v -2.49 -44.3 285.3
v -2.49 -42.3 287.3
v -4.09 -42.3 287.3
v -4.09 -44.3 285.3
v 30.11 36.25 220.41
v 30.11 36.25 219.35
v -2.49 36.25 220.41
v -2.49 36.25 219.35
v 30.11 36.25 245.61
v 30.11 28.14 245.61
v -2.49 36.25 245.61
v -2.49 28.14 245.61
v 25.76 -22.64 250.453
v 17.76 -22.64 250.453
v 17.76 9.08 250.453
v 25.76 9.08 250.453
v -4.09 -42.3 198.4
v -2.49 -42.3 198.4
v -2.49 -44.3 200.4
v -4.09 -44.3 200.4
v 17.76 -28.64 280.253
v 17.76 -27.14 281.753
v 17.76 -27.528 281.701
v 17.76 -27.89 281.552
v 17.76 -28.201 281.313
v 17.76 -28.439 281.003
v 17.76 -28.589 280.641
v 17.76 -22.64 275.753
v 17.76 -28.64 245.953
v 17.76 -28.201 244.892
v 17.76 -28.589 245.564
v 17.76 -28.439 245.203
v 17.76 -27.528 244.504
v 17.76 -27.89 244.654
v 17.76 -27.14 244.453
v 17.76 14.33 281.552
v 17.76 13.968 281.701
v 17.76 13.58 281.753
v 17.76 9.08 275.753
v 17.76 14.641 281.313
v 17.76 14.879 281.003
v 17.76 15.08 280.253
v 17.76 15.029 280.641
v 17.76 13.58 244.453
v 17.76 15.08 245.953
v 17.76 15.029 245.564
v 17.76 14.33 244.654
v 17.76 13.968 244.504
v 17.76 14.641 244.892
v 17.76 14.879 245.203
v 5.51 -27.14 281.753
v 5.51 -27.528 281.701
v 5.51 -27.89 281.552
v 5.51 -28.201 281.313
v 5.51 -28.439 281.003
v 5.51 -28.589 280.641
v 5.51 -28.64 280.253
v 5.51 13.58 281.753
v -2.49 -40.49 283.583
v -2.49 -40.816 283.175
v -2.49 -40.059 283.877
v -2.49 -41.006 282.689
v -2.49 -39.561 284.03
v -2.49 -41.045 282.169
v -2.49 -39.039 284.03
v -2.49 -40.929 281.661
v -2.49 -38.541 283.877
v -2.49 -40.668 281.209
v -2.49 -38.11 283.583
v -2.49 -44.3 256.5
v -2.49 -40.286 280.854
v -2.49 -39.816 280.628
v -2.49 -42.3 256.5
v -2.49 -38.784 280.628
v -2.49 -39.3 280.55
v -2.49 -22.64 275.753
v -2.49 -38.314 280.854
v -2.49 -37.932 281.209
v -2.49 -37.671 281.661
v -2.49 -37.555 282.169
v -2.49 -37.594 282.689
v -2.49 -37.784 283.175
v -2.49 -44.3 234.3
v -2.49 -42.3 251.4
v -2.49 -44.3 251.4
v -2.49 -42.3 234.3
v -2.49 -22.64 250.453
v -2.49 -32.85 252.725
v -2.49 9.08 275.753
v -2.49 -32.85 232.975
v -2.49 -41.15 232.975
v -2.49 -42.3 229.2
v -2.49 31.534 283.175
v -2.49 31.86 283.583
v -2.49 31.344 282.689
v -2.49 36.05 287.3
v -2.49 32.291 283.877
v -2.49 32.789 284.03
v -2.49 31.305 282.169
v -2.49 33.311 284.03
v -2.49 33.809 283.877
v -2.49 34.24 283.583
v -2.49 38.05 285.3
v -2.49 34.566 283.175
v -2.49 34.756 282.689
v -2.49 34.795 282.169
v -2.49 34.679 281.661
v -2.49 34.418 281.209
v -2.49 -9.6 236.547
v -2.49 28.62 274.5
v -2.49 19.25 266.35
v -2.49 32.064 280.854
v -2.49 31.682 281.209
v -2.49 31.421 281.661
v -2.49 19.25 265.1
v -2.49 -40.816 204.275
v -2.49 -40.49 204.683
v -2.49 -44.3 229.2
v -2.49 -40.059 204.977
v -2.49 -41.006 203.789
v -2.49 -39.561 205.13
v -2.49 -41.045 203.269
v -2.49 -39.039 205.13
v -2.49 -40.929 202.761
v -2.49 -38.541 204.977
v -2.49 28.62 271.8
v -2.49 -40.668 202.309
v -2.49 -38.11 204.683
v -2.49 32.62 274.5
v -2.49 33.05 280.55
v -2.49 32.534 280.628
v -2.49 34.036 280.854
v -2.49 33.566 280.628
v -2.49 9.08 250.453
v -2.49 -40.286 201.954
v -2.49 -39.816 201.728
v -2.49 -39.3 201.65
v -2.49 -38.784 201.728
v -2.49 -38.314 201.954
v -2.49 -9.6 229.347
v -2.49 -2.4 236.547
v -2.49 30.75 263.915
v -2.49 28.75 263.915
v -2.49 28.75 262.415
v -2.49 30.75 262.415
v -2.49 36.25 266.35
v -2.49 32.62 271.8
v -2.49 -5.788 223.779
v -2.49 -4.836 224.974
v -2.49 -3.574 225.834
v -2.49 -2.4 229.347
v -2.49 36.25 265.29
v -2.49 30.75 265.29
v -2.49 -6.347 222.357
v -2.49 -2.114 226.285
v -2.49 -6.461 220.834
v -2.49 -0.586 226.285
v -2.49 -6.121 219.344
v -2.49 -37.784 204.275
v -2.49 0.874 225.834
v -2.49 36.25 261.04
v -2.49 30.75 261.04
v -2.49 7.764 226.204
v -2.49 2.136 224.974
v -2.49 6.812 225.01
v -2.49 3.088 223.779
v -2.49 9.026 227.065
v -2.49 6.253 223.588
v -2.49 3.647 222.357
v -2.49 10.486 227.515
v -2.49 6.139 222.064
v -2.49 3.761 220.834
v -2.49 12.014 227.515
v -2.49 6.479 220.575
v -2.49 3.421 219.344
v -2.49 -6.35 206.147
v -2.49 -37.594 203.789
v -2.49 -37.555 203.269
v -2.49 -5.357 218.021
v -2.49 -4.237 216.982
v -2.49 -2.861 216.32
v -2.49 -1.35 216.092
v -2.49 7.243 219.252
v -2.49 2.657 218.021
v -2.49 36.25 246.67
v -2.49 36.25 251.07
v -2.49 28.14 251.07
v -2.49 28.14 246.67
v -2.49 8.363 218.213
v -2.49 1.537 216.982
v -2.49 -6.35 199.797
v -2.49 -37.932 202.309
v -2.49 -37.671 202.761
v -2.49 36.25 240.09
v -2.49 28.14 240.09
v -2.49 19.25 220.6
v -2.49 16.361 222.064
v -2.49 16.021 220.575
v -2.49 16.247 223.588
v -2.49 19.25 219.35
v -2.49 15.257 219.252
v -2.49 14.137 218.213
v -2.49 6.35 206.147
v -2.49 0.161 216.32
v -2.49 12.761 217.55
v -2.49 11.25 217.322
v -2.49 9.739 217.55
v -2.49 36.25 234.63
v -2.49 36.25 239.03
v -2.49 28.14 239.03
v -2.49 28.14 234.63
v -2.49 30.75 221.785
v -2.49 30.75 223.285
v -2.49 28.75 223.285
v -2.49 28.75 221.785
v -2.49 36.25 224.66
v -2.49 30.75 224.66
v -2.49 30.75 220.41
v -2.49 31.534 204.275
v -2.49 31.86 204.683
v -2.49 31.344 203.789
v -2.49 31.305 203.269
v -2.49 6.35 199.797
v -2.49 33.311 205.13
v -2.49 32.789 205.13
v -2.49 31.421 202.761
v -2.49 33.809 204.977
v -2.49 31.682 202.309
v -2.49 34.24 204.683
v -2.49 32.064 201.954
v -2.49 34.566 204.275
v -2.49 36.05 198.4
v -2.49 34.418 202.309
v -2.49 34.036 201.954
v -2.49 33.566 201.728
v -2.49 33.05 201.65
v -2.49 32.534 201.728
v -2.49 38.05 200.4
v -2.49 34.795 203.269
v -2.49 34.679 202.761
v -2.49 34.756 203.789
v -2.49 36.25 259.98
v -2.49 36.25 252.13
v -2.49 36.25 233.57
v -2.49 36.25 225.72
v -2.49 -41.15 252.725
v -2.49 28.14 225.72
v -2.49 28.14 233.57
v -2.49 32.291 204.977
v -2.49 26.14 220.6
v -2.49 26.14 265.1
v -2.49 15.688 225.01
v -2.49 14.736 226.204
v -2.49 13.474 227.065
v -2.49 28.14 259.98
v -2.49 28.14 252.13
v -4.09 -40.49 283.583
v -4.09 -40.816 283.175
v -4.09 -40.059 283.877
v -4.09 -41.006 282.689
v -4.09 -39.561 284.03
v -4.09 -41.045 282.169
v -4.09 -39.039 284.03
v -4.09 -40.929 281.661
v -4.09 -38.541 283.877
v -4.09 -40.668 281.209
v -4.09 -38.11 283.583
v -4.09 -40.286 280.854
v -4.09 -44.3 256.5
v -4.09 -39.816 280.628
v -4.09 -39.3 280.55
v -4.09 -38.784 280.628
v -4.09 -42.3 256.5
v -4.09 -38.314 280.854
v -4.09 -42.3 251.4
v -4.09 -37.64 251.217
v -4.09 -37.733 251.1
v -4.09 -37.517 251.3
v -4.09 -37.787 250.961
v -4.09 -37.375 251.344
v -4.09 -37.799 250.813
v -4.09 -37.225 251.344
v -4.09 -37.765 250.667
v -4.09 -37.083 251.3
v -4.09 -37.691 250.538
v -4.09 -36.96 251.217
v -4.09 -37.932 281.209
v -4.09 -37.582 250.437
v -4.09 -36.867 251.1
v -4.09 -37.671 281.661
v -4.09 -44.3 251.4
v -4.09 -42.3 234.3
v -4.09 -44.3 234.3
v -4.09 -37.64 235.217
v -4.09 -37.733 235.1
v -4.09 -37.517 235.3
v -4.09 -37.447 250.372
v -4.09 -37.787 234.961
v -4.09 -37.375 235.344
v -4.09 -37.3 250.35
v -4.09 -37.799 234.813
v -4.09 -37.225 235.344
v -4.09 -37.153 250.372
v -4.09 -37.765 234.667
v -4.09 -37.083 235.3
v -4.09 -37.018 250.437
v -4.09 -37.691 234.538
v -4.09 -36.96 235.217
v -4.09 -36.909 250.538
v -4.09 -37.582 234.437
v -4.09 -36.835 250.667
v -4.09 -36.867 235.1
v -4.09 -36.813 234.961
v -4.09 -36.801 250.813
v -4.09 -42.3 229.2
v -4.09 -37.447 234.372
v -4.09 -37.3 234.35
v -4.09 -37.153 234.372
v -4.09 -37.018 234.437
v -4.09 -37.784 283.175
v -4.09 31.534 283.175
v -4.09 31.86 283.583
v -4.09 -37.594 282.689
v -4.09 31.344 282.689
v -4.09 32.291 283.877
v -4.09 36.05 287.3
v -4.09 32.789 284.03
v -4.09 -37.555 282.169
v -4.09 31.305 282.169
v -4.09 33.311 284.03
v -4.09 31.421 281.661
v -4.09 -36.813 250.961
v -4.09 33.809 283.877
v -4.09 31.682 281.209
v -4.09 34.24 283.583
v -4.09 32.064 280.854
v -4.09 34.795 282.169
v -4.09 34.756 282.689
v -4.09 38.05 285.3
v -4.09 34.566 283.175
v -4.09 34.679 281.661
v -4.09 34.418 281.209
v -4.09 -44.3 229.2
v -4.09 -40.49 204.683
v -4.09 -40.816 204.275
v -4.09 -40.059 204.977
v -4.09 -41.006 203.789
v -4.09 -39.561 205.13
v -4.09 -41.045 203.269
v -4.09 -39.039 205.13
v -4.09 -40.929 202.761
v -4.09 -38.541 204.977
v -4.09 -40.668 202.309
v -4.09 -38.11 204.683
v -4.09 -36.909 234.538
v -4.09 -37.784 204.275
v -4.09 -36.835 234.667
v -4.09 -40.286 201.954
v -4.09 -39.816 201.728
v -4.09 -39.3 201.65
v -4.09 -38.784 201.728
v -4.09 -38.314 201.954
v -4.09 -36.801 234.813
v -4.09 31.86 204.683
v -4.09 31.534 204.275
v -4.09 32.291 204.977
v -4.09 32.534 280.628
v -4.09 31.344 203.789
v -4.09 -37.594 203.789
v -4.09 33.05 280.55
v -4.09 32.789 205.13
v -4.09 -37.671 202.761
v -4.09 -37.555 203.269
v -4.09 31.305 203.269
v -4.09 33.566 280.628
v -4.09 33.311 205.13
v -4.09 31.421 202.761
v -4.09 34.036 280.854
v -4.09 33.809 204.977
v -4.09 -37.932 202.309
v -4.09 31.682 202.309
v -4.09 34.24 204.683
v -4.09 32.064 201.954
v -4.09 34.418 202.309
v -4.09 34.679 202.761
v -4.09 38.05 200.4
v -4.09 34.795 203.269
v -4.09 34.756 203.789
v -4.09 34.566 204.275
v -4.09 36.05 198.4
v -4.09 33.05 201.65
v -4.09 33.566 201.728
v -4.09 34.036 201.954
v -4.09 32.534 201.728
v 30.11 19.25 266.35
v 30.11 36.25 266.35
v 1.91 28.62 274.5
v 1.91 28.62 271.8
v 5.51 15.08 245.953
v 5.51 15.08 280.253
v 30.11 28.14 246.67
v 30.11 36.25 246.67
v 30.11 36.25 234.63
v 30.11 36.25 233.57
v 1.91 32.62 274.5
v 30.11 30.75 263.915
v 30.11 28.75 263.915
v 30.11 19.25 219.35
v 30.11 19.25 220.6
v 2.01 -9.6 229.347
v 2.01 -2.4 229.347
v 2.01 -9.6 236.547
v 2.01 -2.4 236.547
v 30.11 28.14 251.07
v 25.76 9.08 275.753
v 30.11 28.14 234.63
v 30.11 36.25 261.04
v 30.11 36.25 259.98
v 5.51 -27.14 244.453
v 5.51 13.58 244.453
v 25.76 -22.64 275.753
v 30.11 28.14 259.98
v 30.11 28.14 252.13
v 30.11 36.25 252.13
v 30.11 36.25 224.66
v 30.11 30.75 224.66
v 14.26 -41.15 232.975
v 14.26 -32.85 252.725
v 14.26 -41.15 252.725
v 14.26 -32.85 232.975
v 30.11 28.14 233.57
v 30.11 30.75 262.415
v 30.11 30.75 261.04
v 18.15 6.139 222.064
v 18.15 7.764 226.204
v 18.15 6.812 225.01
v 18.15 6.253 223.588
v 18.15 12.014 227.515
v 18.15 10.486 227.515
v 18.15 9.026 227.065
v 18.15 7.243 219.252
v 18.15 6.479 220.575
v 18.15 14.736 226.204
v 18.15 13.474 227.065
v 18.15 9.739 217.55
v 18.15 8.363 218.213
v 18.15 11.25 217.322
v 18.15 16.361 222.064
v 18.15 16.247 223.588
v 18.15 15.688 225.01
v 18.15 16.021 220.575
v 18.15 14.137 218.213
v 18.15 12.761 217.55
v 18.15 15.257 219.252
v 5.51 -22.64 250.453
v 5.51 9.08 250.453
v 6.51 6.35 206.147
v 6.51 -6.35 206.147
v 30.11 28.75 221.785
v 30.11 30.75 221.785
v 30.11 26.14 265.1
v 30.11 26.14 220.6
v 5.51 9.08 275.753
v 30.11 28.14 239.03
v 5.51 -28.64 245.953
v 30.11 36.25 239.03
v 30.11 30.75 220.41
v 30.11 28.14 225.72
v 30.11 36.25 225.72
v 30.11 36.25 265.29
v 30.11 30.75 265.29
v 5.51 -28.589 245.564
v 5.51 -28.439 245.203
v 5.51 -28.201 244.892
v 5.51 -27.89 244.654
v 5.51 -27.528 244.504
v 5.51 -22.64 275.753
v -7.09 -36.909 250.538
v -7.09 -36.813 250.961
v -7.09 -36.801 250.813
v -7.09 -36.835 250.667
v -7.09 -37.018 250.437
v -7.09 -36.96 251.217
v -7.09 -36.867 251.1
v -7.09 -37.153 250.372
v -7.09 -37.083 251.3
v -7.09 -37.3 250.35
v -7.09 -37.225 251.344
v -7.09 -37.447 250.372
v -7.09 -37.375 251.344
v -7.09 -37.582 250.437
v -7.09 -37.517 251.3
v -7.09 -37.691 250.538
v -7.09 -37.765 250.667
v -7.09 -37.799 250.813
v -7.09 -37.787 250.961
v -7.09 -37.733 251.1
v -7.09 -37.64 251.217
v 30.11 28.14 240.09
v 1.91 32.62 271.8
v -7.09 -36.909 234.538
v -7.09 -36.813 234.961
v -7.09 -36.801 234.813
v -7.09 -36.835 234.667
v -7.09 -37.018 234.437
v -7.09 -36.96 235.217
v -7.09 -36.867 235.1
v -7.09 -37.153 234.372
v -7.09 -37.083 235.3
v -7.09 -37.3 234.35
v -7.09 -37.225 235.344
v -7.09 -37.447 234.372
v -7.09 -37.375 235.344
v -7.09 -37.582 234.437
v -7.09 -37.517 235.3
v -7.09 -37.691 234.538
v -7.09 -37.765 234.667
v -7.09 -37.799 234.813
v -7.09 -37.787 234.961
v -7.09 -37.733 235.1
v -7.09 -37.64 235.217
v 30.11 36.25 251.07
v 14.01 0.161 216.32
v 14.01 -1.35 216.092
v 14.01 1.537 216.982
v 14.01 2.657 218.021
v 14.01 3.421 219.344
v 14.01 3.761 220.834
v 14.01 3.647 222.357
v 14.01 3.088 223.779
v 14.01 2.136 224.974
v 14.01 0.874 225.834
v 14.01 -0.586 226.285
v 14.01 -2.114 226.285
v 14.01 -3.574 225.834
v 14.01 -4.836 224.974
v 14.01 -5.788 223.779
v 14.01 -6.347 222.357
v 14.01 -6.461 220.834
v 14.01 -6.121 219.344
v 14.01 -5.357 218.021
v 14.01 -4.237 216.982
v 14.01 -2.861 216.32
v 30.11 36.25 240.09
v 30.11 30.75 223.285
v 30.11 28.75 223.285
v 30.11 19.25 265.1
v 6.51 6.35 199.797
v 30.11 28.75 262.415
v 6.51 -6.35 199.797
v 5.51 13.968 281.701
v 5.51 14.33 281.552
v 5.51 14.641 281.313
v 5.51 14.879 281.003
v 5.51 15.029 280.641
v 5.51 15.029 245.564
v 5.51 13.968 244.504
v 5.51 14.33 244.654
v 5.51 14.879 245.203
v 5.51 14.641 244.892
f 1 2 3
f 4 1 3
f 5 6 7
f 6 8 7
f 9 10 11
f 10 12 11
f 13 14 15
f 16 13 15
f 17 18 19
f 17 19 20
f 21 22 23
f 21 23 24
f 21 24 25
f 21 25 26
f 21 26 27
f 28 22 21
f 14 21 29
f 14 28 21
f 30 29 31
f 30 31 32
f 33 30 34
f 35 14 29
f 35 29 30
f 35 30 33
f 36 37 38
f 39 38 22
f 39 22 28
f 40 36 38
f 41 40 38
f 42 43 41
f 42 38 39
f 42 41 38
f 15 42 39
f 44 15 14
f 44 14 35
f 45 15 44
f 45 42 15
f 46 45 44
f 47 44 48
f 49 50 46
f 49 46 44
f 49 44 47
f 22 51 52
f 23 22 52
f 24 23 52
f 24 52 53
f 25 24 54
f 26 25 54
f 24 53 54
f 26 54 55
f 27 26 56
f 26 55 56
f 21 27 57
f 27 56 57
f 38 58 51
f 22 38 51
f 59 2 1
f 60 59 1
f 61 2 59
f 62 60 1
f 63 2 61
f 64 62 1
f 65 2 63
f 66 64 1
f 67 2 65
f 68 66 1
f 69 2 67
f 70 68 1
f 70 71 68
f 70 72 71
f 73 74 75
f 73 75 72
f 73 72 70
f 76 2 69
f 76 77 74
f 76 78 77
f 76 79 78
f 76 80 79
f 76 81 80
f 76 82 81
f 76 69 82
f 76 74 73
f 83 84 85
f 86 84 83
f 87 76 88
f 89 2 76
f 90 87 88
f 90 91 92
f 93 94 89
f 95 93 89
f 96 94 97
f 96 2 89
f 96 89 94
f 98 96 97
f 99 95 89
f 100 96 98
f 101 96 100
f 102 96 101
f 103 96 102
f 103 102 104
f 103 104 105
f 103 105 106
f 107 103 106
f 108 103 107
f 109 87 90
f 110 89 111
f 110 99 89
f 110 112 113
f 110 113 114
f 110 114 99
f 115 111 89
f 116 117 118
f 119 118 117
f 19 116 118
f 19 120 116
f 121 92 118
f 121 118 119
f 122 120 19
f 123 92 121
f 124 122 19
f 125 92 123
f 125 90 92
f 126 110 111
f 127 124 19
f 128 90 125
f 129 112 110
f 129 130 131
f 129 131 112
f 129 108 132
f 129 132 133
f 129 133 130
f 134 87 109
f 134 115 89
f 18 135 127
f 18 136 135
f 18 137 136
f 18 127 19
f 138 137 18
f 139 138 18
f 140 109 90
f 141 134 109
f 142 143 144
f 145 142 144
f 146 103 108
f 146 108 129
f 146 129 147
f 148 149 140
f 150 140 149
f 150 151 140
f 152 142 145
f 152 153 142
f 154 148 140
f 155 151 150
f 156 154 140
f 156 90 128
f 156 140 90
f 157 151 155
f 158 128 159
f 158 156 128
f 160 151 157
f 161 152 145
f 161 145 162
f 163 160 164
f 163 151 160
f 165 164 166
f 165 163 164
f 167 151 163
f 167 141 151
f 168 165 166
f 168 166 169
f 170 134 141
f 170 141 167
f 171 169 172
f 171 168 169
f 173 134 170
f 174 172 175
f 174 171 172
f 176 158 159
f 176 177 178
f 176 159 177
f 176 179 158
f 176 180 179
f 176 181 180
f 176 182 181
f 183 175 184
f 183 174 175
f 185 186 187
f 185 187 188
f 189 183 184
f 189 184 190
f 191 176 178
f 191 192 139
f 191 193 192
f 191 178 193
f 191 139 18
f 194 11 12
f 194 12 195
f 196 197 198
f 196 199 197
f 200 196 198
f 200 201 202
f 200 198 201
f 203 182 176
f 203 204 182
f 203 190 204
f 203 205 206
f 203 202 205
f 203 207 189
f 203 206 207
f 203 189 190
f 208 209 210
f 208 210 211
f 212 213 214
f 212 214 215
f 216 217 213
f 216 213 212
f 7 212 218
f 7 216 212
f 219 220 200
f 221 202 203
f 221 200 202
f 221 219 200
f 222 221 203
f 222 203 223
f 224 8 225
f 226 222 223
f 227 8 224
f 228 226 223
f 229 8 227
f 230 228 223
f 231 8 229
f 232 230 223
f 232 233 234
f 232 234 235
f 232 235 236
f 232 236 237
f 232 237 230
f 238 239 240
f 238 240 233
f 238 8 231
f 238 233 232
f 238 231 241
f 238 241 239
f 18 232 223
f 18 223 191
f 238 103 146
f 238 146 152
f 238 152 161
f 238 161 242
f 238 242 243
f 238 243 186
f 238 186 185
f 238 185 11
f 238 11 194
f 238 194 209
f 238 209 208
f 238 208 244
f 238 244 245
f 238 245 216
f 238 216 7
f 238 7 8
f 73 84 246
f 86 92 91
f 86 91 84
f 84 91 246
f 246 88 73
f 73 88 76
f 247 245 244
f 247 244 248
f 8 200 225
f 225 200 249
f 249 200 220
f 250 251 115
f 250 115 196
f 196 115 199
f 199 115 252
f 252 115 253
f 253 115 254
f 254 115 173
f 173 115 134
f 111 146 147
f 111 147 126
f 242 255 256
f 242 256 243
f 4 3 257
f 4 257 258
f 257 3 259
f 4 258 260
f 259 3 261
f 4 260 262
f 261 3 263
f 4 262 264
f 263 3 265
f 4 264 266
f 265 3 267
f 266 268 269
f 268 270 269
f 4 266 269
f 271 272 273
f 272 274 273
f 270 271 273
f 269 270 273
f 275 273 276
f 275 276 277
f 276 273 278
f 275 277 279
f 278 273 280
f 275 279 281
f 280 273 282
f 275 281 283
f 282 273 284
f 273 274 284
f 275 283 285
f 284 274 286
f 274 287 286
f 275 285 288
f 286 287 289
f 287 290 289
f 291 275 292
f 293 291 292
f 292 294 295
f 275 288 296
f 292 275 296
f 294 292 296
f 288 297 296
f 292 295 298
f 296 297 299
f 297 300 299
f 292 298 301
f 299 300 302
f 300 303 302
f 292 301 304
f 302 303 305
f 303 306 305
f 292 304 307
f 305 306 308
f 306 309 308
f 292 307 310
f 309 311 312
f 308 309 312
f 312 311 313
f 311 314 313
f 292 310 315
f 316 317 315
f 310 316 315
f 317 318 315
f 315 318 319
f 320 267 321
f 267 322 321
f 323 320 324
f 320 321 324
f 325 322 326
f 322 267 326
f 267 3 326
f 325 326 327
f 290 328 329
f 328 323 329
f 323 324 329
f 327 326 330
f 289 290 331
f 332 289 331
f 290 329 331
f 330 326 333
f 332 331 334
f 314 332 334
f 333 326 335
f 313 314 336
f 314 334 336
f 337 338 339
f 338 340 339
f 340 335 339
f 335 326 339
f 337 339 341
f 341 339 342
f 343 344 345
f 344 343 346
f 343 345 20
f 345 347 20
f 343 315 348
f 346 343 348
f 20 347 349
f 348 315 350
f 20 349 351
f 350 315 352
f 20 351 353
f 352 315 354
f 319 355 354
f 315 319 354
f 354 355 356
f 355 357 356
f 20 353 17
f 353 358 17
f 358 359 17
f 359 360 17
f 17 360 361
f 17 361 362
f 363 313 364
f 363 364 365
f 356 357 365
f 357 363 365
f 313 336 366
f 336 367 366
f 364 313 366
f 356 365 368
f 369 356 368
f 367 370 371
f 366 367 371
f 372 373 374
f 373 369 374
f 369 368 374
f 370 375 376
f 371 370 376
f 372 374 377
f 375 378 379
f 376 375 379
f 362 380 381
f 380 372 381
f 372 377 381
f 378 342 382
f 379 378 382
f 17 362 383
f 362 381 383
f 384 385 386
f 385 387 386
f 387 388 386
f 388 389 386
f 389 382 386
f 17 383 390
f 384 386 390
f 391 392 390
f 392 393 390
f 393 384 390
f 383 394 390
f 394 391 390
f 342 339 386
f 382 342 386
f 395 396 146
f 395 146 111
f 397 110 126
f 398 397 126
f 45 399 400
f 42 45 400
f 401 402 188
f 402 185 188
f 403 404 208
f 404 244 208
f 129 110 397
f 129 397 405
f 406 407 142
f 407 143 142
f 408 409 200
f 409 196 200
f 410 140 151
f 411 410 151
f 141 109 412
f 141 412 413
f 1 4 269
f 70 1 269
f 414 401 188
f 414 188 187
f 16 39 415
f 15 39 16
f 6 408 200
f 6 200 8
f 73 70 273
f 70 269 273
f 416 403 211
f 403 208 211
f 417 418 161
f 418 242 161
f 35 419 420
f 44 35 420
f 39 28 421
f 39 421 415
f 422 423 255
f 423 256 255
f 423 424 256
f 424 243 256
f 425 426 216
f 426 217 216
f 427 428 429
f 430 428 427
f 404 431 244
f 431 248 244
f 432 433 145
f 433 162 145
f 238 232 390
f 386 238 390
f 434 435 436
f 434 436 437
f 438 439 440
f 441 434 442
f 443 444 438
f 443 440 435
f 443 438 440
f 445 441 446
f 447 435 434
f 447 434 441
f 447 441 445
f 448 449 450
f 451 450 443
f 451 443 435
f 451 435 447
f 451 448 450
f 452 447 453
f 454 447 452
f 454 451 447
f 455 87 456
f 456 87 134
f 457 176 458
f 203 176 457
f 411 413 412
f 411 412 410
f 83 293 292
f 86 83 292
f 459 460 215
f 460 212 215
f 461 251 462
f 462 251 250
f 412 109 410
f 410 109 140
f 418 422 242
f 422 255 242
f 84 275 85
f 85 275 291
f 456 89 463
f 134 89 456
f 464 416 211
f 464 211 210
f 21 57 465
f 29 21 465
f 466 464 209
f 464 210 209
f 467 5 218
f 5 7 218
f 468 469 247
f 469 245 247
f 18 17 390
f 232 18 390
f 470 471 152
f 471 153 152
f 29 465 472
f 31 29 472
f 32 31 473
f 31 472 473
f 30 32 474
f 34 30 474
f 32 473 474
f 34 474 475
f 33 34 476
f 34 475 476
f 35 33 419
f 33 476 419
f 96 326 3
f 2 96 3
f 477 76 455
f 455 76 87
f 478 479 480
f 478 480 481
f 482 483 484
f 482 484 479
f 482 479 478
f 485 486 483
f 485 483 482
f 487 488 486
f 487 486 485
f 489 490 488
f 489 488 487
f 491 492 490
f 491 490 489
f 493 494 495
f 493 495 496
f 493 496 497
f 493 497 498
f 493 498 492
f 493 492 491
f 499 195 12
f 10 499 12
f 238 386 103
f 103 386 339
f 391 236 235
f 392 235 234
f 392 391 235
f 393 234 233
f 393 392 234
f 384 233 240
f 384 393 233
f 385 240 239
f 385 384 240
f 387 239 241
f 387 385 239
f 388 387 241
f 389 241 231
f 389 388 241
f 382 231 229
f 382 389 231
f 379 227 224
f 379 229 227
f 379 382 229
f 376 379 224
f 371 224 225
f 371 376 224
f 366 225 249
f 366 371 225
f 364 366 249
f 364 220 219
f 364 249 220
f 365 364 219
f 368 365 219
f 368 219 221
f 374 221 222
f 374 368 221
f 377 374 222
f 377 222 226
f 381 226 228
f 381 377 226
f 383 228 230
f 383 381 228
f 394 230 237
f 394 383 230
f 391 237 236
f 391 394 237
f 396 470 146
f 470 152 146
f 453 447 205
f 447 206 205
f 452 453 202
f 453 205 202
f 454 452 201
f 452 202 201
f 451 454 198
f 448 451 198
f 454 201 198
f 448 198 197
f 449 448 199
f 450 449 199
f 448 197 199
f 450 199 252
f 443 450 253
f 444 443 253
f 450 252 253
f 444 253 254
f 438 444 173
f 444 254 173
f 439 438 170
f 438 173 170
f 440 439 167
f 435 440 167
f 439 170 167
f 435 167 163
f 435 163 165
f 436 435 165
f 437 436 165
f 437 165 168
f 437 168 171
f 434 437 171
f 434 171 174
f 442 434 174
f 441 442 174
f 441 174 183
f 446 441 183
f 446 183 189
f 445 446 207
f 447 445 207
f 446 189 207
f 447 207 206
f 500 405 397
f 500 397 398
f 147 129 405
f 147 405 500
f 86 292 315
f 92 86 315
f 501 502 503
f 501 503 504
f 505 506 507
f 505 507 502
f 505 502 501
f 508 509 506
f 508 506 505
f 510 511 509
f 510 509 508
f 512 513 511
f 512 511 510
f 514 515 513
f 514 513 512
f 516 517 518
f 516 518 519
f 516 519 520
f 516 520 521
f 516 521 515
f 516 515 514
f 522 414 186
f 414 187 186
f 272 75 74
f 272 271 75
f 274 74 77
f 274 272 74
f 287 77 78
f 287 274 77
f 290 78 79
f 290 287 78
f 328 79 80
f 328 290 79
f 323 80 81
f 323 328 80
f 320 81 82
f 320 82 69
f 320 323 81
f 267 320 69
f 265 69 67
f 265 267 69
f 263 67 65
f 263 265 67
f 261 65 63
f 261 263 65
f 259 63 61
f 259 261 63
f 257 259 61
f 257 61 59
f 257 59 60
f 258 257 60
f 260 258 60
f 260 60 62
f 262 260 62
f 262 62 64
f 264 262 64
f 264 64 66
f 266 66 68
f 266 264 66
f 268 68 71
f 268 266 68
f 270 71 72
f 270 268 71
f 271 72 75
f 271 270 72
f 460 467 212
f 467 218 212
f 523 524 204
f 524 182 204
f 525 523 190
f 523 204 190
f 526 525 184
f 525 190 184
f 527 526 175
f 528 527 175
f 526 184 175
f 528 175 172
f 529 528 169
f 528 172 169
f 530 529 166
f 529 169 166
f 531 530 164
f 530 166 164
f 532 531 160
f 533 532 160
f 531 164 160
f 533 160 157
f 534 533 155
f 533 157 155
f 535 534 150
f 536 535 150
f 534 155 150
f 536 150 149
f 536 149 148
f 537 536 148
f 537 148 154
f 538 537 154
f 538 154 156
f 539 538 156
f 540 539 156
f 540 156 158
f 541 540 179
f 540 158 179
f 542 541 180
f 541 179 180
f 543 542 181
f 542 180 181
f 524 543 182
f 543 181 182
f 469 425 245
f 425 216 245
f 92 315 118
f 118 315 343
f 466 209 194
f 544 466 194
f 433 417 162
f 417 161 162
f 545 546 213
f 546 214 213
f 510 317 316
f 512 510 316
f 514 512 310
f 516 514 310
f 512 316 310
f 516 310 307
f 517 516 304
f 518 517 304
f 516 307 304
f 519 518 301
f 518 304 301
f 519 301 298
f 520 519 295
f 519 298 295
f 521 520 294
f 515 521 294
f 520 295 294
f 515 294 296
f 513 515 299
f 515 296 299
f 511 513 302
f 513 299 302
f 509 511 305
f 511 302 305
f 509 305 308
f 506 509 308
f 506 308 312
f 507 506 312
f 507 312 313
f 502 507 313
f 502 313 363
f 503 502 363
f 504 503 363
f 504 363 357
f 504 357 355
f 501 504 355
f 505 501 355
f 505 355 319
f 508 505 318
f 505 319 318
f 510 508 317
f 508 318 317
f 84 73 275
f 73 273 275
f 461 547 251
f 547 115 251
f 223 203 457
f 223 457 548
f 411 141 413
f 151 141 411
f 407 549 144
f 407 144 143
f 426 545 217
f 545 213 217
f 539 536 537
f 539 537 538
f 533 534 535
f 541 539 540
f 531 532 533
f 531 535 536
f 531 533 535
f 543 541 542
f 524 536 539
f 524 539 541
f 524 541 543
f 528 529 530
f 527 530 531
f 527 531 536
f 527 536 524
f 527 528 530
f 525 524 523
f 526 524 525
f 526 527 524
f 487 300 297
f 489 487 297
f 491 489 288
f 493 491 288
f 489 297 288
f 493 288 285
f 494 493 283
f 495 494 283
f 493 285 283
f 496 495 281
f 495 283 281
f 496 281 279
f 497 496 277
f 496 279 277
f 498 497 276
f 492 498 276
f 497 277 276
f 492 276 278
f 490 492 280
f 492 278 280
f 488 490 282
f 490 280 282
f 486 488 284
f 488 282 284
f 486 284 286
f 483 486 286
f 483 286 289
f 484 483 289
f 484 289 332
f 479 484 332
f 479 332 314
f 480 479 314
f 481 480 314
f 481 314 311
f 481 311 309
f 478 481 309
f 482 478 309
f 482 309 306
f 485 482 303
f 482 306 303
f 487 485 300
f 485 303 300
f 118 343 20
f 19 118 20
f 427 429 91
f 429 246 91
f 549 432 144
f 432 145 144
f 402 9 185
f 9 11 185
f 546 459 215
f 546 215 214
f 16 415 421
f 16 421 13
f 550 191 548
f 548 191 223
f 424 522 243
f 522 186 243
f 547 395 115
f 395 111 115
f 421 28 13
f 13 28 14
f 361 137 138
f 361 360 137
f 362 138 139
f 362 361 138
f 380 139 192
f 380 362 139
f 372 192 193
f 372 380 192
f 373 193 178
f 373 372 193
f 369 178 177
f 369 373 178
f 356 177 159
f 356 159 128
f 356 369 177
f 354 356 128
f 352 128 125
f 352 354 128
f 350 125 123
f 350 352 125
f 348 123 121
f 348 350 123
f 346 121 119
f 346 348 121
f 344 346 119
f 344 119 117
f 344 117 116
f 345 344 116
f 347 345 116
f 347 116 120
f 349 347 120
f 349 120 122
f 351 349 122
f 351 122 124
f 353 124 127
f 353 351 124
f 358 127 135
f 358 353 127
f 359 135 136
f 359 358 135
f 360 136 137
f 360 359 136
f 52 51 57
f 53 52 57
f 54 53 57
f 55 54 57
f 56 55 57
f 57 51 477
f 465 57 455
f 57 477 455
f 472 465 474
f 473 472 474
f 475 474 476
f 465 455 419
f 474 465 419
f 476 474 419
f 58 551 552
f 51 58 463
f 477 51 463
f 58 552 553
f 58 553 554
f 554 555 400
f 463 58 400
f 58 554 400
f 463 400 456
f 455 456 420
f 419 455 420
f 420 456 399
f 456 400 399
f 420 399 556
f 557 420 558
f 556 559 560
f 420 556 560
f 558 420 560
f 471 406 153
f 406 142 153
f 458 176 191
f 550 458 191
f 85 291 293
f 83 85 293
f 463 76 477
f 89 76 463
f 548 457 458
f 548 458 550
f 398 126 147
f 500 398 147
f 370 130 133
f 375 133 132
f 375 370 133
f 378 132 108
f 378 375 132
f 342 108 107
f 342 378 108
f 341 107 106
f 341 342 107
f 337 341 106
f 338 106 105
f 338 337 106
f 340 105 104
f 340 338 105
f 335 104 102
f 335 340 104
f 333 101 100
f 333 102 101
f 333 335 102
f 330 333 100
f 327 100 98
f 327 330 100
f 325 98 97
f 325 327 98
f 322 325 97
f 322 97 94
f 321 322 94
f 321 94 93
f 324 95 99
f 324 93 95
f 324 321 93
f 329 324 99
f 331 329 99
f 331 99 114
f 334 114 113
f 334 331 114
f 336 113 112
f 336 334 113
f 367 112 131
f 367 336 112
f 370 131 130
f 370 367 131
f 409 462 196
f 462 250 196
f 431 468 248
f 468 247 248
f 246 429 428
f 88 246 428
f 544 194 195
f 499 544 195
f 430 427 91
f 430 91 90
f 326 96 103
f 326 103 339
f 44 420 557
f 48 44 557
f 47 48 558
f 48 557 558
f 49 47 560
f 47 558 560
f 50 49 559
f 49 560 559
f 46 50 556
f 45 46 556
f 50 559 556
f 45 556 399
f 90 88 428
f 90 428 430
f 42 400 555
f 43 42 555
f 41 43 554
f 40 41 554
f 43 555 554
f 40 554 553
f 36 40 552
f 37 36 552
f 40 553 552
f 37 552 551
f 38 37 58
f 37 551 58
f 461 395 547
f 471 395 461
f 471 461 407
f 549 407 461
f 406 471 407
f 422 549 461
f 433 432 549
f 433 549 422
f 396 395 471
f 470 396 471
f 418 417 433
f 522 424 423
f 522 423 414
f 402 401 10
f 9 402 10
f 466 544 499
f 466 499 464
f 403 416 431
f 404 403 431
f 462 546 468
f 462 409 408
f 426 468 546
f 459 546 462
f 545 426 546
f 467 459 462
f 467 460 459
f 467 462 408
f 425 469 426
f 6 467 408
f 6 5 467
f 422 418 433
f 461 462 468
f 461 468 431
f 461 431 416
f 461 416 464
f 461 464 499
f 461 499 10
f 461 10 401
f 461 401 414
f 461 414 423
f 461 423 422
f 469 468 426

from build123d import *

# Parameters (mm, degrees)
BOSS_EXTRUDE1_START        = -1.6
BOSS_EXTRUDE1_OUTLINE_W    = 25.3
BOSS_EXTRUDE1_OUTLINE_H    = 31.72
BOSS_EXTRUDE1_DEPTH        = 29.85
BOSS_EXTRUDE1_START_2      = 8
BOSS_EXTRUDE1_2_OUTLINE_W  = 25.3
BOSS_EXTRUDE1_2_OUTLINE_H  = 31.72
BOSS_EXTRUDE1_2_OUTLINE_R  = 5.125
BOSS_EXTRUDE1_2_DEPTH      = 12.25
BOSS_EXTRUDE1_3_OUTLINE_R  = 1.75
BOSS_EXTRUDE1_3_OUTLINE_W  = 25.3
BOSS_EXTRUDE1_3_OUTLINE_H  = 31.72
BOSS_EXTRUDE1_3_DEPTH      = 1.6
BOSS_EXTRUDE1_4_OUTLINE_R  = 5.125
BOSS_EXTRUDE1_4_OUTLINE_W  = 19.75
BOSS_EXTRUDE1_4_OUTLINE_H  = 8.3
BOSS_EXTRUDE1_4_DEPTH      = 16.14
BOSS_EXTRUDE1_5_OUTLINE_W  = 6.35
BOSS_EXTRUDE1_5_OUTLINE_H  = 12.7
BOSS_EXTRUDE1_5_DEPTH      = 9
BOSS_EXTRUDE1_START_3      = 28.25
BOSS_EXTRUDE1_6_DEPTH      = 1.75
BOSS_EXTRUDE1_7_OUTLINE_W  = 7.2
BOSS_EXTRUDE1_7_OUTLINE_H  = 7.2
BOSS_EXTRUDE1_7_DEPTH      = 4.5
BOSS_EXTRUDE1_START_4      = 16.14
BOSS_EXTRUDE1_8_OUTLINE_W  = 19.75
BOSS_EXTRUDE1_8_OUTLINE_H  = 8.3
BOSS_EXTRUDE1_8_DEPTH      = 0.61
BOSS_EXTRUDE1_START_5      = -1.5
BOSS_EXTRUDE1_9_OUTLINE_W  = 5.1
BOSS_EXTRUDE1_9_OUTLINE_H  = 1.7
BOSS_EXTRUDE1_9_DEPTH      = 1.5
BOSS_EXTRUDE1_START_6      = 20.25
BOSS_EXTRUDE1_10_OUTLINE_R = 5.125
BOSS_EXTRUDE1_10_DEPTH     = 0.39
CUT_EXTRUDE1_START         = -1.5
SKETCH1_3_W                = 125.683572393
SKETCH1_3_H                = 110.20529993
SKETCH1_3_W_2              = 88.9
SKETCH1_3_H_2              = 82.35
SKETCH1_3_R                = 1.75
SKETCH1_3_W_3              = 5.1
SKETCH1_3_H_3              = 2
CUT_EXTRUDE1_DEPTH         = 1.5
CHAMFER1_SIZE              = 2
SKETCH2_W                  = 2.7
SKETCH2_H                  = 4
BOSS_EXTRUDE2_DEPTH        = 4.4
SKETCH3_R                  = 0.5
BOSS_EXTRUDE3_DEPTH        = 3
MOVE_FACE1_BY              = 2.6
MOVE_FACE2_BY              = 0.36


with BuildPart() as part:
    # Boss-Extrude1: read off the stored shape, not the designer's step
    # Boss-Extrude1 outline → Boss-Extrude1 (new body)
    with BuildSketch(Plane(origin=(-2.49, 0, 0), x_dir=(0, 0, -1), z_dir=(1, 0, 0)).offset(BOSS_EXTRUDE1_START)):
        with Locations((-263.102543264, -6.78)):
            Rectangle(BOSS_EXTRUDE1_OUTLINE_W, BOSS_EXTRUDE1_OUTLINE_H)
        Polygon((-240.09, 28.14), (-245.61, 28.14), (-245.61, 36.25), (-246.67, 36.25), (-246.67, 28.14), (-251.07, 28.14), (-251.07, 36.25), (-252.13, 36.25), (-252.13, 28.14), (-259.98, 28.14), (-259.98, 36.25), (-261.04, 36.25), (-261.04, 30.75), (-262.415, 30.75), (-262.415, 28.75), (-263.915, 28.75), (-263.915, 30.75), (-265.29, 30.75), (-265.29, 36.25), (-266.35, 36.25), (-266.35, 19.25), (-265.1, 19.25), (-265.1, 26.14), (-220.6, 26.14), (-220.6, 19.25), (-219.35, 19.25), (-219.35, 36.25), (-220.41, 36.25), (-220.41, 30.75), (-221.785, 30.75), (-221.785, 28.75), (-223.285, 28.75), (-223.285, 30.75), (-224.66, 30.75), (-224.66, 36.25), (-225.72, 36.25), (-225.72, 28.14), (-233.57, 28.14), (-233.57, 36.25), (-234.63, 36.25), (-234.63, 28.14), (-239.03, 28.14), (-239.03, 36.25), (-240.09, 36.25), align=None)
    extrude(amount=BOSS_EXTRUDE1_DEPTH)

    # Boss-Extrude1 2 outline → Boss-Extrude1 2 (add)
    # profile 1 of 2: a face of its own
    with BuildSketch(Plane(origin=(-2.49, 0, 0), x_dir=(0, 0, -1), z_dir=(1, 0, 0)).offset(BOSS_EXTRUDE1_START_2)):
        with BuildLine():
            ThreePointArc((-280.252543264, 15.08), (-281.313203436, 14.640660172), (-281.752543264, 13.58))
            Line((-281.752543264, 13.58), (-281.752543264, -27.14))
            ThreePointArc((-281.752543264, -27.14), (-281.313203436, -28.200660172), (-280.252543264, -28.64))
            Line((-280.252543264, -28.64), (-245.952543264, -28.64))
            ThreePointArc((-245.952543264, -28.64), (-244.891883092, -28.200660172), (-244.452543264, -27.14))
            Line((-244.452543264, -27.14), (-244.452543264, 13.58))
            ThreePointArc((-244.452543264, 13.58), (-244.891883092, 14.640660172), (-245.952543264, 15.08))
            Line((-245.952543264, 15.08), (-280.252543264, 15.08))
        make_face()
        with Locations((-263.102543264, -6.78)):
            Rectangle(BOSS_EXTRUDE1_2_OUTLINE_W, BOSS_EXTRUDE1_2_OUTLINE_H, mode=Mode.SUBTRACT)
    # profile 2 of 2: a face of its own
    with BuildSketch(Plane(origin=(-2.49, 0, 0), x_dir=(0, 0, -1), z_dir=(1, 0, 0)).offset(BOSS_EXTRUDE1_START_2)):
        with Locations((-222.447456736, 11.25)):
            Circle(BOSS_EXTRUDE1_2_OUTLINE_R)
    extrude(amount=BOSS_EXTRUDE1_2_DEPTH)

    # Boss-Extrude1 3 outline → Boss-Extrude1 3 (add)
    with BuildSketch(Plane(origin=(-2.49, 0, 0), x_dir=(0, 0, -1), z_dir=(1, 0, 0)).offset(BOSS_EXTRUDE1_START)):
        Polygon((-251.4, -42.3), (-251.4, -44.3), (-234.3, -44.3), (-234.3, -42.3), (-229.2, -42.3), (-229.2, -44.3), (-198.4, -44.3), (-198.4, 38.05), (-287.3, 38.05), (-287.3, -44.3), (-256.5, -44.3), (-256.5, -42.3), align=None)
        with Locations((-282.3, -39.3)):
            Circle(BOSS_EXTRUDE1_3_OUTLINE_R, mode=Mode.SUBTRACT)
        with Locations((-203.4, -39.3)):
            Circle(BOSS_EXTRUDE1_3_OUTLINE_R, mode=Mode.SUBTRACT)
        with Locations((-282.3, 33.05)):
            Circle(BOSS_EXTRUDE1_3_OUTLINE_R, mode=Mode.SUBTRACT)
        Polygon((-245.61, 36.25), (-245.61, 28.14), (-240.09, 28.14), (-240.09, 36.25), (-239.03, 36.25), (-239.03, 28.14), (-234.63, 28.14), (-234.63, 36.25), (-233.57, 36.25), (-233.57, 28.14), (-225.72, 28.14), (-225.72, 36.25), (-224.66, 36.25), (-224.66, 30.75), (-223.285, 30.75), (-223.285, 28.75), (-221.785, 28.75), (-221.785, 30.75), (-220.41, 30.75), (-220.41, 36.25), (-219.35, 36.25), (-219.35, 19.25), (-220.6, 19.25), (-220.6, 26.14), (-265.1, 26.14), (-265.1, 19.25), (-266.35, 19.25), (-266.35, 36.25), (-265.29, 36.25), (-265.29, 30.75), (-263.915, 30.75), (-263.915, 28.75), (-262.415, 28.75), (-262.415, 30.75), (-261.04, 30.75), (-261.04, 36.25), (-259.98, 36.25), (-259.98, 28.14), (-252.13, 28.14), (-252.13, 36.25), (-251.07, 36.25), (-251.07, 28.14), (-246.67, 28.14), (-246.67, 36.25), align=None, mode=Mode.SUBTRACT)
        with Locations((-203.4, 33.05)):
            Circle(BOSS_EXTRUDE1_3_OUTLINE_R, mode=Mode.SUBTRACT)
        with Locations((-263.102543264, -6.78)):
            Rectangle(BOSS_EXTRUDE1_3_OUTLINE_W, BOSS_EXTRUDE1_3_OUTLINE_H, mode=Mode.SUBTRACT)
    extrude(amount=BOSS_EXTRUDE1_3_DEPTH)

    # Boss-Extrude1 4 outline → Boss-Extrude1 4 (add)
    with BuildSketch(Plane(origin=(-2.49, 0, 0), x_dir=(0, 0, -1), z_dir=(1, 0, 0))):
        with Locations((-221.216821393, -1.35)):
            Circle(BOSS_EXTRUDE1_4_OUTLINE_R)
        with Locations((-242.85, -37)):
            Rectangle(BOSS_EXTRUDE1_4_OUTLINE_W, BOSS_EXTRUDE1_4_OUTLINE_H)
        with Locations((-222.447456736, 11.25)):
            Circle(BOSS_EXTRUDE1_4_OUTLINE_R)
    extrude(amount=BOSS_EXTRUDE1_4_DEPTH)

    # Boss-Extrude1 5 outline → Boss-Extrude1 5 (add)
    with BuildSketch(Plane(origin=(-2.49, 0, 0), x_dir=(0, 0, -1), z_dir=(1, 0, 0))):
        with Locations((-202.972456736, 0)):
            Rectangle(BOSS_EXTRUDE1_5_OUTLINE_W, BOSS_EXTRUDE1_5_OUTLINE_H)
    extrude(amount=BOSS_EXTRUDE1_5_DEPTH)

    # Boss-Extrude1 6 outline → Boss-Extrude1 6 (add)
    with BuildSketch(Plane(origin=(-2.49, 0, 0), x_dir=(0, 0, -1), z_dir=(1, 0, 0)).offset(BOSS_EXTRUDE1_START_3)):
        Polygon((-240.09, 28.14), (-245.61, 28.14), (-245.61, 36.25), (-246.67, 36.25), (-246.67, 28.14), (-251.07, 28.14), (-251.07, 36.25), (-252.13, 36.25), (-252.13, 28.14), (-259.98, 28.14), (-259.98, 36.25), (-261.04, 36.25), (-261.04, 30.75), (-262.415, 30.75), (-262.415, 28.75), (-263.915, 28.75), (-263.915, 30.75), (-265.29, 30.75), (-265.29, 36.25), (-266.35, 36.25), (-266.35, 19.25), (-265.1, 19.25), (-265.1, 26.14), (-220.6, 26.14), (-220.6, 19.25), (-219.35, 19.25), (-219.35, 36.25), (-220.41, 36.25), (-220.41, 30.75), (-221.785, 30.75), (-221.785, 28.75), (-223.285, 28.75), (-223.285, 30.75), (-224.66, 30.75), (-224.66, 36.25), (-225.72, 36.25), (-225.72, 28.14), (-233.57, 28.14), (-233.57, 36.25), (-234.63, 36.25), (-234.63, 28.14), (-239.03, 28.14), (-239.03, 36.25), (-240.09, 36.25), align=None)
    extrude(amount=BOSS_EXTRUDE1_6_DEPTH)

    # Boss-Extrude1 7 outline → Boss-Extrude1 7 (add)
    with BuildSketch(Plane(origin=(-2.49, 0, 0), x_dir=(0, 0, -1), z_dir=(1, 0, 0))):
        with Locations((-232.947456736, -6)):
            Rectangle(BOSS_EXTRUDE1_7_OUTLINE_W, BOSS_EXTRUDE1_7_OUTLINE_H)
    extrude(amount=BOSS_EXTRUDE1_7_DEPTH)

    # Boss-Extrude1 8 outline → Boss-Extrude1 8 (add)
    with BuildSketch(Plane(origin=(-2.49, 0, 0), x_dir=(0, 0, -1), z_dir=(1, 0, 0)).offset(BOSS_EXTRUDE1_START_4)):
        with Locations((-242.85, -37)):
            Rectangle(BOSS_EXTRUDE1_8_OUTLINE_W, BOSS_EXTRUDE1_8_OUTLINE_H)
    extrude(amount=BOSS_EXTRUDE1_8_DEPTH)

    # Boss-Extrude1 9 outline → Boss-Extrude1 9 (add)
    with BuildSketch(Plane(origin=(-2.49, 0, 0), x_dir=(0, 0, -1), z_dir=(1, 0, 0)).offset(BOSS_EXTRUDE1_START_5)):
        with Locations((-253.95, -43.15)):
            Rectangle(BOSS_EXTRUDE1_9_OUTLINE_W, BOSS_EXTRUDE1_9_OUTLINE_H)
        with Locations((-231.75, -43.15)):
            Rectangle(BOSS_EXTRUDE1_9_OUTLINE_W, BOSS_EXTRUDE1_9_OUTLINE_H)
        Polygon((-287.752543264, -23.847456736), (-287.3, -24.3), (-287.3, 24.580582618), (-287.752543264, 24.580582618), align=None)
        Polygon((-198.4, 26.105086528), (-198.4, -24.3), (-197.947456736, -23.847456736), (-197.947456736, 25.652543264), align=None)
        with BuildLine():
            Line((-281.502543264, 33.330582618), (-281.502543264, 31.492257161))
            ThreePointArc((-281.502543264, 31.492257161), (-280.609414894, 32.597869487), (-280.831414071, 34.00171181))
            Line((-280.831414071, 34.00171181), (-281.502543264, 33.330582618))
        make_face()
        with BuildLine():
            Line((-203.60722612, 31.312312647), (-205.137687353, 32.84277388))
            ThreePointArc((-205.137687353, 32.84277388), (-204.637436867, 31.812563133), (-203.60722612, 31.312312647))
        make_face()
    extrude(amount=BOSS_EXTRUDE1_9_DEPTH)

    # Boss-Extrude1 10 outline → Boss-Extrude1 10 (add)
    with BuildSketch(Plane(origin=(-2.49, 0, 0), x_dir=(0, 0, -1), z_dir=(1, 0, 0)).offset(BOSS_EXTRUDE1_START_6)):
        with Locations((-222.447456736, 11.25)):
            Circle(BOSS_EXTRUDE1_10_OUTLINE_R)
    extrude(amount=BOSS_EXTRUDE1_10_DEPTH)

    # Sketch1<3> → Cut-Extrude1 (cut)
    # profile 1 of 7: a face of its own
    with BuildSketch(Plane(origin=(-2.49, 0, 0), x_dir=(0, 0, -1), z_dir=(1, 0, 0)).offset(CUT_EXTRUDE1_START)):
        with Locations((-237.633848224, 0.203353058)):
            Rectangle(SKETCH1_3_W, SKETCH1_3_H)
        with Locations((-242.85, -3.125)):
            Rectangle(SKETCH1_3_W_2, SKETCH1_3_H_2, mode=Mode.SUBTRACT)
    # profile 2 of 7: a face of its own
    with BuildSketch(Plane(origin=(-2.49, 0, 0), x_dir=(0, 0, -1), z_dir=(1, 0, 0)).offset(CUT_EXTRUDE1_START)):
        with Locations((-282.3, 33.05)):
            Circle(SKETCH1_3_R)
    # profile 3 of 7: a face of its own
    with BuildSketch(Plane(origin=(-2.49, 0, 0), x_dir=(0, 0, -1), z_dir=(1, 0, 0)).offset(CUT_EXTRUDE1_START)):
        with Locations((-203.4, 33.05)):
            Circle(SKETCH1_3_R)
    # profile 4 of 7: a face of its own
    with BuildSketch(Plane(origin=(-2.49, 0, 0), x_dir=(0, 0, -1), z_dir=(1, 0, 0)).offset(CUT_EXTRUDE1_START)):
        with Locations((-203.4, -39.3)):
            Circle(SKETCH1_3_R)
    # profile 5 of 7: a face of its own
    with BuildSketch(Plane(origin=(-2.49, 0, 0), x_dir=(0, 0, -1), z_dir=(1, 0, 0)).offset(CUT_EXTRUDE1_START)):
        with Locations((-282.3, -39.3)):
            Circle(SKETCH1_3_R)
    # profile 6 of 7: a face of its own
    with BuildSketch(Plane(origin=(-2.49, 0, 0), x_dir=(0, 0, -1), z_dir=(1, 0, 0)).offset(CUT_EXTRUDE1_START)):
        with Locations((-253.95, -43.3)):
            Rectangle(SKETCH1_3_W_3, SKETCH1_3_H_3)
    # profile 7 of 7: a face of its own
    with BuildSketch(Plane(origin=(-2.49, 0, 0), x_dir=(0, 0, -1), z_dir=(1, 0, 0)).offset(CUT_EXTRUDE1_START)):
        with Locations((-231.75, -43.3)):
            Rectangle(SKETCH1_3_W_3, SKETCH1_3_H_3)
    extrude(amount=CUT_EXTRUDE1_DEPTH, mode=Mode.SUBTRACT)

    # Chamfer1
    chamfer1_edges = [part.edges().sort_by_distance(p)[0] for p in [
        (-3.29, -44.3, 287.3),
        (-3.29, 38.05, 198.4),
        (-3.29, 38.05, 287.3),
        (-3.29, -44.3, 198.4),
    ]]
    chamfer(chamfer1_edges, length=CHAMFER1_SIZE)

    # Sketch2 → Boss-Extrude2 (add)
    with BuildSketch(Plane(origin=(-2.49, 0, 0), x_dir=(0, 0, -1), z_dir=(1, 0, 0))):
        with Locations((-273.15, 30.62)):
            Rectangle(SKETCH2_W, SKETCH2_H)
    extrude(amount=BOSS_EXTRUDE2_DEPTH)

    # Sketch3 → Boss-Extrude3 (add)
    with BuildSketch(Plane.ZY.offset(4.09)):
        with Locations(Location((234.85, -37.3, 0), (0, 0, 180))):
            Circle(SKETCH3_R)
        with Locations(Location((250.85, -37.3, 0), (0, 0, 180))):
            Circle(SKETCH3_R)
    extrude(amount=BOSS_EXTRUDE3_DEPTH)

    # Move Face1: a face moved outward by 2.6
    extrude(part.faces().sort_by_distance((27.51, 27.75, 242.85))[0], amount=MOVE_FACE1_BY, dir=(1, 0, 0))

    # Move Face2: a face moved outward by 0.36
    extrude(part.faces().sort_by_distance((13.65, -1.35, 221.216821393))[0], amount=MOVE_FACE2_BY, dir=(1, 0, 0))


solid = part.part
